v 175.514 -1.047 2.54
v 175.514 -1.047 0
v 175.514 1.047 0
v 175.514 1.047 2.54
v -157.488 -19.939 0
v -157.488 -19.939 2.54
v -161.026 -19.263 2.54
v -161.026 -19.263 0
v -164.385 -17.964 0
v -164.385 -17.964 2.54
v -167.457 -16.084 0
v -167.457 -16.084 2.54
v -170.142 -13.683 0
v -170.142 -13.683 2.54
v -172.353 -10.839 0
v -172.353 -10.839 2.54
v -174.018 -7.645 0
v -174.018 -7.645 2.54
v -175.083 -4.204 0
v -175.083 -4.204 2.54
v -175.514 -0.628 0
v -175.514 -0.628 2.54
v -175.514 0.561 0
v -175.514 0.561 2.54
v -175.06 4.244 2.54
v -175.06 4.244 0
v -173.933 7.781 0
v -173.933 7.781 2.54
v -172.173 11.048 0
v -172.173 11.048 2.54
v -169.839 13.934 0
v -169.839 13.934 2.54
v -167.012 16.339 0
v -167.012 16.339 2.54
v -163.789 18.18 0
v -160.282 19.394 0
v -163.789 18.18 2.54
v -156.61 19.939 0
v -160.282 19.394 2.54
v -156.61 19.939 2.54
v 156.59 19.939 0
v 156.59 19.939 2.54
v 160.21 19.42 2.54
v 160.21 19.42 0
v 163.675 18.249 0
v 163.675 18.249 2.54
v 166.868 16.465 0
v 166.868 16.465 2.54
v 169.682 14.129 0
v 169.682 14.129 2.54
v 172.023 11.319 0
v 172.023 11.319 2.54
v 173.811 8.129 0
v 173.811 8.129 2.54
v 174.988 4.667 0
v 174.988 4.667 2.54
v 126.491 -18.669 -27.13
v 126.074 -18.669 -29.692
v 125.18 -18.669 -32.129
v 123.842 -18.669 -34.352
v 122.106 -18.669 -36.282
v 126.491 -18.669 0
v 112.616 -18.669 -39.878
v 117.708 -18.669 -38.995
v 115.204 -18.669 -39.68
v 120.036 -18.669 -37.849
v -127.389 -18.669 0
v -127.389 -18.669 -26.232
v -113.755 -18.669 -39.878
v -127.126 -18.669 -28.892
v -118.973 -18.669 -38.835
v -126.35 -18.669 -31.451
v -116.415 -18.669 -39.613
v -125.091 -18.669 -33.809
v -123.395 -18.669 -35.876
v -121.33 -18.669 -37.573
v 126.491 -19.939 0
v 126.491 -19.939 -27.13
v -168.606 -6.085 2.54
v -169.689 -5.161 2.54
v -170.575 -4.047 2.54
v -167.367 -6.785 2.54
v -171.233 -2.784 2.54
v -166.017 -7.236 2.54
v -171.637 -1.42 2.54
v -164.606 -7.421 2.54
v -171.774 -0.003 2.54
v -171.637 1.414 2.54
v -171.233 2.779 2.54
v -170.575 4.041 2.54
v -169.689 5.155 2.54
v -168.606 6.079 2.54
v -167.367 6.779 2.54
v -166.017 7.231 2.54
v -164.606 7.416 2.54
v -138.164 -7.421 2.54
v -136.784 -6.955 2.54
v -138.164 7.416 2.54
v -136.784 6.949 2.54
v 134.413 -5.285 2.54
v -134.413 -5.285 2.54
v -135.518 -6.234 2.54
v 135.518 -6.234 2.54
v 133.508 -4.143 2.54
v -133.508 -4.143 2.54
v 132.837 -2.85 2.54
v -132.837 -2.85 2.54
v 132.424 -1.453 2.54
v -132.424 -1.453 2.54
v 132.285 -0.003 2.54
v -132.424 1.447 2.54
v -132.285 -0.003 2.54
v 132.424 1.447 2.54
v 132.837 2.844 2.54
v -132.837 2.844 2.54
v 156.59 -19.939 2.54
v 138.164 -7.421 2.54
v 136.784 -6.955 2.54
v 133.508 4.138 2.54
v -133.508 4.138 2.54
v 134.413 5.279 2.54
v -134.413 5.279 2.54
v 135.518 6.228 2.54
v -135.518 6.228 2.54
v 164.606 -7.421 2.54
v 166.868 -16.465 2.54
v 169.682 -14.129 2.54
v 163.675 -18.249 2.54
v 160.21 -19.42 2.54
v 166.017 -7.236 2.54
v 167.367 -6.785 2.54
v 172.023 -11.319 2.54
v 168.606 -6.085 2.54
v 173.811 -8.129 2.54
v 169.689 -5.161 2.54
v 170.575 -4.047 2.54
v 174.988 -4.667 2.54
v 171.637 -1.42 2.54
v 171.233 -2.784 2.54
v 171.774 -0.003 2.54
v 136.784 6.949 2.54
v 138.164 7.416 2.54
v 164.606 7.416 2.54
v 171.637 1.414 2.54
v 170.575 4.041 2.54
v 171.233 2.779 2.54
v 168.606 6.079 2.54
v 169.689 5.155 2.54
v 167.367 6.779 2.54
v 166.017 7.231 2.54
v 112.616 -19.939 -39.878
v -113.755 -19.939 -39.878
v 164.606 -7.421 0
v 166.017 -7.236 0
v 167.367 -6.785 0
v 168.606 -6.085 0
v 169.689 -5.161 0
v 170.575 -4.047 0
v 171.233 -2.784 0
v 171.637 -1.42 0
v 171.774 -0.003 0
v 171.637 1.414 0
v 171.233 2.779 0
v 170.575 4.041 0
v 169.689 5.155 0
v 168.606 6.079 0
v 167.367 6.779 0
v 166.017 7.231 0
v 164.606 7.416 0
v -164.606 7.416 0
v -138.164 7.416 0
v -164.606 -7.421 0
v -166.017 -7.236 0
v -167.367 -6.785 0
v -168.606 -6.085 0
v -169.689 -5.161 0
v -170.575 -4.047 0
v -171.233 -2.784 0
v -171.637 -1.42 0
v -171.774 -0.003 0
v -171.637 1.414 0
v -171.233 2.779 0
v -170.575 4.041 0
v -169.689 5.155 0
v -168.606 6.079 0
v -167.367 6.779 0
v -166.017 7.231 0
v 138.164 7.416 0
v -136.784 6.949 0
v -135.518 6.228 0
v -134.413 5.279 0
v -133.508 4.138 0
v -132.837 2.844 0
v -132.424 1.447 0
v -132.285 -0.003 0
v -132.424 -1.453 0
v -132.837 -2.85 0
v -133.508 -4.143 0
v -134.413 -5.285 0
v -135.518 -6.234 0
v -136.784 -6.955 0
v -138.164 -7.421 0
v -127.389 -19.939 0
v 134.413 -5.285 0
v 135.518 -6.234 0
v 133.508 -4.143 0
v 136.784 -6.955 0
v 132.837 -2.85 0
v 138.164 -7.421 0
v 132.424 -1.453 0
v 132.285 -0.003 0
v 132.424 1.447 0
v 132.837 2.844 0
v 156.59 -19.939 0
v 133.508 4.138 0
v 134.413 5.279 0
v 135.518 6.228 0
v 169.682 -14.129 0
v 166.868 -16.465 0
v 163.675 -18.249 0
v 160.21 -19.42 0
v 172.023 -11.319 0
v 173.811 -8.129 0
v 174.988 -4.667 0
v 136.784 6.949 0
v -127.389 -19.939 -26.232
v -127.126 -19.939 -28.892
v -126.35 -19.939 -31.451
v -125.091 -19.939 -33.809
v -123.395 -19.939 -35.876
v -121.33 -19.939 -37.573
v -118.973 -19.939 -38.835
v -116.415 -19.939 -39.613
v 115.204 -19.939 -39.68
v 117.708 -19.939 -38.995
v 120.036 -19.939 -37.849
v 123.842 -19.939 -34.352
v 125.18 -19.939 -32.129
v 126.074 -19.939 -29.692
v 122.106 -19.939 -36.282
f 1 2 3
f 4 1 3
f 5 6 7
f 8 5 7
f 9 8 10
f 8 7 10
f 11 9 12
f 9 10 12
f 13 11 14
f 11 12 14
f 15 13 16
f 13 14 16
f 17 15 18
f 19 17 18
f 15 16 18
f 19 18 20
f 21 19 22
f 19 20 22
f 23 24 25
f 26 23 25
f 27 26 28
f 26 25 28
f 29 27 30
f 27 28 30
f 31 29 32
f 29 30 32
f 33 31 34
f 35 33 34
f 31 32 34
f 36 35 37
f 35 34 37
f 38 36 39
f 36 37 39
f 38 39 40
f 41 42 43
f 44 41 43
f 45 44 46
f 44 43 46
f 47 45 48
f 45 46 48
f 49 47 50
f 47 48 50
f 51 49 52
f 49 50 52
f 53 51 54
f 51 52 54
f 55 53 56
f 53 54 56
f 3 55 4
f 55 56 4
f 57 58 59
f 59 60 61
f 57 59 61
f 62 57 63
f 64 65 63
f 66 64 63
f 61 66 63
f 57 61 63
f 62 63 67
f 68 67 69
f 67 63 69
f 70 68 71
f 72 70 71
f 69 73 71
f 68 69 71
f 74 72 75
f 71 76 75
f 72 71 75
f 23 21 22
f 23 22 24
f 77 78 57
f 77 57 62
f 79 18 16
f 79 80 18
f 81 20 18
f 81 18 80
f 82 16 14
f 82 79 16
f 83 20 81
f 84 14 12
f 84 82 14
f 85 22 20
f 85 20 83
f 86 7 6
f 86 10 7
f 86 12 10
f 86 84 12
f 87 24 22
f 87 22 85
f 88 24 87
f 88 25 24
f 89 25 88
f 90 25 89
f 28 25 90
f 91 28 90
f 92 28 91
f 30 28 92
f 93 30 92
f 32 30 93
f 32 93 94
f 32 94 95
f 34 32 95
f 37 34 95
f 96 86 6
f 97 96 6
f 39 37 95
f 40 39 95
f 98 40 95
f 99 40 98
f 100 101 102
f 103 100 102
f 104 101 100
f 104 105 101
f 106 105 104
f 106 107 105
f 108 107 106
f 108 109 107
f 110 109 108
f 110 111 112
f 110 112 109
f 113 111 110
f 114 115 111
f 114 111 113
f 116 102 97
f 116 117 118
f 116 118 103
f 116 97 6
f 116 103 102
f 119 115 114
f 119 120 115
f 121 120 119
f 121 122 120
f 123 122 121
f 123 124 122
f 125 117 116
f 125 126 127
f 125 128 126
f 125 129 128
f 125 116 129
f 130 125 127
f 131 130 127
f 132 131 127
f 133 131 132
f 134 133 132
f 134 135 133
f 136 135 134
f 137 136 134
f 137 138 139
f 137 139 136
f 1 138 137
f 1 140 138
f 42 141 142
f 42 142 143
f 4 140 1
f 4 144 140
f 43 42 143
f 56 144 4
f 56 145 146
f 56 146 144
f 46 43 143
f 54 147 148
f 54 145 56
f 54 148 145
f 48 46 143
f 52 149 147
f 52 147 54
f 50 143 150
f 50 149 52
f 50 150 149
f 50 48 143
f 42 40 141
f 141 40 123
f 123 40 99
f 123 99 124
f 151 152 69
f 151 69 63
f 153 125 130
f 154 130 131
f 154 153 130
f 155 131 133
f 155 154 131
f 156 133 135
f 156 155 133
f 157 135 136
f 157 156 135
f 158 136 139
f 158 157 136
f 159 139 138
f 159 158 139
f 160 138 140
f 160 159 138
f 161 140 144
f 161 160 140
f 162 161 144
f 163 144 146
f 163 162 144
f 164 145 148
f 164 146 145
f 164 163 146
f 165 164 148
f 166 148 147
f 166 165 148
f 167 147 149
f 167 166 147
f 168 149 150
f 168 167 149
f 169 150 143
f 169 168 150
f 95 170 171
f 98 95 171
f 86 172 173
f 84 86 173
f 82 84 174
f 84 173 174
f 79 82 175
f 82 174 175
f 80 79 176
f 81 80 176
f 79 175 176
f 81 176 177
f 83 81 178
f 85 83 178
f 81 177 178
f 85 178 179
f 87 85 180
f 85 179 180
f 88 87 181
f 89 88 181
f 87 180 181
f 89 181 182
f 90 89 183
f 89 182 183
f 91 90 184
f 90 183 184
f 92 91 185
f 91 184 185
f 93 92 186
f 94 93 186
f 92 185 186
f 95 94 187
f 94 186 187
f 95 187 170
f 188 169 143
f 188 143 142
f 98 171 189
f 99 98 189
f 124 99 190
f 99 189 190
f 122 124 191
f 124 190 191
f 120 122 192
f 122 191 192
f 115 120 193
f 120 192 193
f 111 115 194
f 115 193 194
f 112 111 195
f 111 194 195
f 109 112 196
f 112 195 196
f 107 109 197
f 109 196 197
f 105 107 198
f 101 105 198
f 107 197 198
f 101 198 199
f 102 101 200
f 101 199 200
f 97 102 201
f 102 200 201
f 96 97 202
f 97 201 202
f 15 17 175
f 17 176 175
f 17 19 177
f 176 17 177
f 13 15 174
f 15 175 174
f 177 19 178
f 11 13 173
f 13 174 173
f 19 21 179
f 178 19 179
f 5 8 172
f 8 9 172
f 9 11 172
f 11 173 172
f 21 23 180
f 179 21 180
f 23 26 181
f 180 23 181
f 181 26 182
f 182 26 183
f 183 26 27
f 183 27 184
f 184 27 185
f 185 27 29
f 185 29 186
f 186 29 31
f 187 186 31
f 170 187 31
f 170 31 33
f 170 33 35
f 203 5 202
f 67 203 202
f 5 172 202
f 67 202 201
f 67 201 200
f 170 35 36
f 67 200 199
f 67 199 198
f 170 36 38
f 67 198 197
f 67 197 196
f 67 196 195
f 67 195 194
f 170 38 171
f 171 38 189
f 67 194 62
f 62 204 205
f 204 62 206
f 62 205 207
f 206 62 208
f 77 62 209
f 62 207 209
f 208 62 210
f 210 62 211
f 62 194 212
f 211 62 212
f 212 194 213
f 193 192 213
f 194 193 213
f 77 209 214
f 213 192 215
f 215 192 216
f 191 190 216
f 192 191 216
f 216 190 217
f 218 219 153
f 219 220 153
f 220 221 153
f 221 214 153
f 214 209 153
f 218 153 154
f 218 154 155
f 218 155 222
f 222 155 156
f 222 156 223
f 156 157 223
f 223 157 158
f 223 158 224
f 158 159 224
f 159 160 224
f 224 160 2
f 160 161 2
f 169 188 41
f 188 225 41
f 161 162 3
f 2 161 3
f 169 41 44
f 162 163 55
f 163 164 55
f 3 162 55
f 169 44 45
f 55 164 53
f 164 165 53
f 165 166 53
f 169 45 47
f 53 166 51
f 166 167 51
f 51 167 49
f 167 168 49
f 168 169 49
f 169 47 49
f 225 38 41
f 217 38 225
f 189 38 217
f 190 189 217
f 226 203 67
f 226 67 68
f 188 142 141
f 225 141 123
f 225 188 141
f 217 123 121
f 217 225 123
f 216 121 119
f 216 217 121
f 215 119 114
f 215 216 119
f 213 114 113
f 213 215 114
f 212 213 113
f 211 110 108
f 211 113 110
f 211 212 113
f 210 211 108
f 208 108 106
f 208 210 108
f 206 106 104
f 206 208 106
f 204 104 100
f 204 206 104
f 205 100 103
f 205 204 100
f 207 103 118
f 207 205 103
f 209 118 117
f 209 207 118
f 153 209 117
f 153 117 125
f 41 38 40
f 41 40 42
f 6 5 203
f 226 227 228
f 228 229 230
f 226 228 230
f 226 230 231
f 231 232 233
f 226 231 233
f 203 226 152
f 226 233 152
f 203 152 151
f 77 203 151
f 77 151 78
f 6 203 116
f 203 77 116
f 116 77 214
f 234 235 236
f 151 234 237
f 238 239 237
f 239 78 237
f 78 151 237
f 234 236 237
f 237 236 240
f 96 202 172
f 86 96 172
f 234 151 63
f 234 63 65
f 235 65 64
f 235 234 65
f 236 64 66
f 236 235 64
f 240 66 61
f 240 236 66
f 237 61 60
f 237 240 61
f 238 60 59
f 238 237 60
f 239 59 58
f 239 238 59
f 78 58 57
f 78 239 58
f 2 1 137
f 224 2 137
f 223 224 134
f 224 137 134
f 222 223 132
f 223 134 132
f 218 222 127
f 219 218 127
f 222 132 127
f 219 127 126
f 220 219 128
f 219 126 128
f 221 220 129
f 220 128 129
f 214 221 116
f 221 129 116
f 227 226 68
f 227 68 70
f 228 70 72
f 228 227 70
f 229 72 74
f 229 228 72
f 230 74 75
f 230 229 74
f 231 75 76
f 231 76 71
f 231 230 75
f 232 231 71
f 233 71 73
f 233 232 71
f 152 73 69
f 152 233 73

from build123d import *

# Parameters (mm, degrees)
SKETCH1_W           = 351.028
SKETCH1_H           = 39.878
BOSS_EXTRUDE1_DEPTH = 2.54
CUT_EXTRUDE1_DEPTH  = 2.54
BOSS_EXTRUDE3_DEPTH = 1.27
CUT_EXTRUDE2_DEPTH  = 182.08885497


with BuildPart() as part:
    # Sketch1 → Boss-Extrude1 (new body)
    with BuildSketch(Plane.XY):
        Rectangle(SKETCH1_W, SKETCH1_H)
    extrude(amount=BOSS_EXTRUDE1_DEPTH)

    # Sketch2 → Cut-Extrude1 (cut)
    with BuildSketch(Plane.XY.offset(2.54)):
        with BuildLine():
            ThreePointArc((-175.514, 0.560558273), (-169.838630059, 13.933642373), (-156.610444921, 19.939))
            Line((-156.610444921, 19.939), (-175.514, 19.939))
            Line((-175.514, 19.939), (-175.514, 0.560558273))
        make_face()
        with BuildLine():
            ThreePointArc((-157.487509507, -19.939), (-170.14228569, -13.682666917), (-175.514, -0.627792376))
            Line((-175.514, -0.627792376), (-175.514, -19.939))
            Line((-175.514, -19.939), (-157.487509507, -19.939))
        make_face()
        with BuildLine():
            Line((175.514, 19.939), (156.589507007, 19.939))
            ThreePointArc((156.589507007, 19.939), (169.681715457, 14.129412549), (175.514, 1.047299362))
            Line((175.514, 1.047299362), (175.514, 19.939))
        make_face()
        with BuildLine():
            Line((175.514, -19.939), (175.514, -1.047299362))
            ThreePointArc((175.514, -1.047299362), (169.681715457, -14.129412549), (156.589507007, -19.939))
            Line((156.589507007, -19.939), (175.514, -19.939))
        make_face()
    extrude(amount=-CUT_EXTRUDE1_DEPTH, mode=Mode.SUBTRACT)

    # Sketch4 → Boss-Extrude3 (add)
    with BuildSketch(Plane(origin=(0, -19.939, 0), x_dir=(-1, 0, 0), z_dir=(0, -1, 0))):
        with BuildLine():
            Line((-126.490507007, 27.129664964), (-126.490507007, 0))
            Line((-126.490507007, 0), (127.388509507, 0))
            Line((127.388509507, 0), (127.388509507, 26.231634315))
            ThreePointArc((127.388509507, 26.231634315), (123.395271006, 35.875988979), (113.754553273, 39.878))
            Line((113.754553273, 39.878), (-112.615934561, 39.878))
            ThreePointArc((-112.615934561, 39.878), (-122.105920459, 36.282047556), (-126.490507007, 27.129664964))
        make_face()
    extrude(amount=-BOSS_EXTRUDE3_DEPTH)

    # Sketch5 → Cut-Extrude2 (cut, through all)
    with BuildSketch(Plane(origin=(0, 0, 0), x_dir=(-1, 0, 0), z_dir=(0, 0, -1))):
        with BuildLine():
            Line((-164.606102616, 7.415708173), (-138.164214663, 7.415708173))
            ThreePointArc((-138.164214663, 7.415708173), (-132.284701758, -0.002856694), (-138.164214663, -7.42142156))
            Line((-138.164214663, -7.42142156), (-164.606102616, -7.42142156))
            ThreePointArc((-164.606102616, -7.42142156), (-171.773613025, -0.002856694), (-164.606102616, 7.415708173))
        make_face()
    cut_extrude2 = extrude(amount=-CUT_EXTRUDE2_DEPTH, mode=Mode.SUBTRACT)

    # Mirror1: Cut-Extrude2 across plane
    add(cut_extrude2.mirror(Plane(origin=(0, 0, 0), x_dir=(0, 0, 1), z_dir=(1, 0, 0))), mode=Mode.SUBTRACT)


solid = part.part
